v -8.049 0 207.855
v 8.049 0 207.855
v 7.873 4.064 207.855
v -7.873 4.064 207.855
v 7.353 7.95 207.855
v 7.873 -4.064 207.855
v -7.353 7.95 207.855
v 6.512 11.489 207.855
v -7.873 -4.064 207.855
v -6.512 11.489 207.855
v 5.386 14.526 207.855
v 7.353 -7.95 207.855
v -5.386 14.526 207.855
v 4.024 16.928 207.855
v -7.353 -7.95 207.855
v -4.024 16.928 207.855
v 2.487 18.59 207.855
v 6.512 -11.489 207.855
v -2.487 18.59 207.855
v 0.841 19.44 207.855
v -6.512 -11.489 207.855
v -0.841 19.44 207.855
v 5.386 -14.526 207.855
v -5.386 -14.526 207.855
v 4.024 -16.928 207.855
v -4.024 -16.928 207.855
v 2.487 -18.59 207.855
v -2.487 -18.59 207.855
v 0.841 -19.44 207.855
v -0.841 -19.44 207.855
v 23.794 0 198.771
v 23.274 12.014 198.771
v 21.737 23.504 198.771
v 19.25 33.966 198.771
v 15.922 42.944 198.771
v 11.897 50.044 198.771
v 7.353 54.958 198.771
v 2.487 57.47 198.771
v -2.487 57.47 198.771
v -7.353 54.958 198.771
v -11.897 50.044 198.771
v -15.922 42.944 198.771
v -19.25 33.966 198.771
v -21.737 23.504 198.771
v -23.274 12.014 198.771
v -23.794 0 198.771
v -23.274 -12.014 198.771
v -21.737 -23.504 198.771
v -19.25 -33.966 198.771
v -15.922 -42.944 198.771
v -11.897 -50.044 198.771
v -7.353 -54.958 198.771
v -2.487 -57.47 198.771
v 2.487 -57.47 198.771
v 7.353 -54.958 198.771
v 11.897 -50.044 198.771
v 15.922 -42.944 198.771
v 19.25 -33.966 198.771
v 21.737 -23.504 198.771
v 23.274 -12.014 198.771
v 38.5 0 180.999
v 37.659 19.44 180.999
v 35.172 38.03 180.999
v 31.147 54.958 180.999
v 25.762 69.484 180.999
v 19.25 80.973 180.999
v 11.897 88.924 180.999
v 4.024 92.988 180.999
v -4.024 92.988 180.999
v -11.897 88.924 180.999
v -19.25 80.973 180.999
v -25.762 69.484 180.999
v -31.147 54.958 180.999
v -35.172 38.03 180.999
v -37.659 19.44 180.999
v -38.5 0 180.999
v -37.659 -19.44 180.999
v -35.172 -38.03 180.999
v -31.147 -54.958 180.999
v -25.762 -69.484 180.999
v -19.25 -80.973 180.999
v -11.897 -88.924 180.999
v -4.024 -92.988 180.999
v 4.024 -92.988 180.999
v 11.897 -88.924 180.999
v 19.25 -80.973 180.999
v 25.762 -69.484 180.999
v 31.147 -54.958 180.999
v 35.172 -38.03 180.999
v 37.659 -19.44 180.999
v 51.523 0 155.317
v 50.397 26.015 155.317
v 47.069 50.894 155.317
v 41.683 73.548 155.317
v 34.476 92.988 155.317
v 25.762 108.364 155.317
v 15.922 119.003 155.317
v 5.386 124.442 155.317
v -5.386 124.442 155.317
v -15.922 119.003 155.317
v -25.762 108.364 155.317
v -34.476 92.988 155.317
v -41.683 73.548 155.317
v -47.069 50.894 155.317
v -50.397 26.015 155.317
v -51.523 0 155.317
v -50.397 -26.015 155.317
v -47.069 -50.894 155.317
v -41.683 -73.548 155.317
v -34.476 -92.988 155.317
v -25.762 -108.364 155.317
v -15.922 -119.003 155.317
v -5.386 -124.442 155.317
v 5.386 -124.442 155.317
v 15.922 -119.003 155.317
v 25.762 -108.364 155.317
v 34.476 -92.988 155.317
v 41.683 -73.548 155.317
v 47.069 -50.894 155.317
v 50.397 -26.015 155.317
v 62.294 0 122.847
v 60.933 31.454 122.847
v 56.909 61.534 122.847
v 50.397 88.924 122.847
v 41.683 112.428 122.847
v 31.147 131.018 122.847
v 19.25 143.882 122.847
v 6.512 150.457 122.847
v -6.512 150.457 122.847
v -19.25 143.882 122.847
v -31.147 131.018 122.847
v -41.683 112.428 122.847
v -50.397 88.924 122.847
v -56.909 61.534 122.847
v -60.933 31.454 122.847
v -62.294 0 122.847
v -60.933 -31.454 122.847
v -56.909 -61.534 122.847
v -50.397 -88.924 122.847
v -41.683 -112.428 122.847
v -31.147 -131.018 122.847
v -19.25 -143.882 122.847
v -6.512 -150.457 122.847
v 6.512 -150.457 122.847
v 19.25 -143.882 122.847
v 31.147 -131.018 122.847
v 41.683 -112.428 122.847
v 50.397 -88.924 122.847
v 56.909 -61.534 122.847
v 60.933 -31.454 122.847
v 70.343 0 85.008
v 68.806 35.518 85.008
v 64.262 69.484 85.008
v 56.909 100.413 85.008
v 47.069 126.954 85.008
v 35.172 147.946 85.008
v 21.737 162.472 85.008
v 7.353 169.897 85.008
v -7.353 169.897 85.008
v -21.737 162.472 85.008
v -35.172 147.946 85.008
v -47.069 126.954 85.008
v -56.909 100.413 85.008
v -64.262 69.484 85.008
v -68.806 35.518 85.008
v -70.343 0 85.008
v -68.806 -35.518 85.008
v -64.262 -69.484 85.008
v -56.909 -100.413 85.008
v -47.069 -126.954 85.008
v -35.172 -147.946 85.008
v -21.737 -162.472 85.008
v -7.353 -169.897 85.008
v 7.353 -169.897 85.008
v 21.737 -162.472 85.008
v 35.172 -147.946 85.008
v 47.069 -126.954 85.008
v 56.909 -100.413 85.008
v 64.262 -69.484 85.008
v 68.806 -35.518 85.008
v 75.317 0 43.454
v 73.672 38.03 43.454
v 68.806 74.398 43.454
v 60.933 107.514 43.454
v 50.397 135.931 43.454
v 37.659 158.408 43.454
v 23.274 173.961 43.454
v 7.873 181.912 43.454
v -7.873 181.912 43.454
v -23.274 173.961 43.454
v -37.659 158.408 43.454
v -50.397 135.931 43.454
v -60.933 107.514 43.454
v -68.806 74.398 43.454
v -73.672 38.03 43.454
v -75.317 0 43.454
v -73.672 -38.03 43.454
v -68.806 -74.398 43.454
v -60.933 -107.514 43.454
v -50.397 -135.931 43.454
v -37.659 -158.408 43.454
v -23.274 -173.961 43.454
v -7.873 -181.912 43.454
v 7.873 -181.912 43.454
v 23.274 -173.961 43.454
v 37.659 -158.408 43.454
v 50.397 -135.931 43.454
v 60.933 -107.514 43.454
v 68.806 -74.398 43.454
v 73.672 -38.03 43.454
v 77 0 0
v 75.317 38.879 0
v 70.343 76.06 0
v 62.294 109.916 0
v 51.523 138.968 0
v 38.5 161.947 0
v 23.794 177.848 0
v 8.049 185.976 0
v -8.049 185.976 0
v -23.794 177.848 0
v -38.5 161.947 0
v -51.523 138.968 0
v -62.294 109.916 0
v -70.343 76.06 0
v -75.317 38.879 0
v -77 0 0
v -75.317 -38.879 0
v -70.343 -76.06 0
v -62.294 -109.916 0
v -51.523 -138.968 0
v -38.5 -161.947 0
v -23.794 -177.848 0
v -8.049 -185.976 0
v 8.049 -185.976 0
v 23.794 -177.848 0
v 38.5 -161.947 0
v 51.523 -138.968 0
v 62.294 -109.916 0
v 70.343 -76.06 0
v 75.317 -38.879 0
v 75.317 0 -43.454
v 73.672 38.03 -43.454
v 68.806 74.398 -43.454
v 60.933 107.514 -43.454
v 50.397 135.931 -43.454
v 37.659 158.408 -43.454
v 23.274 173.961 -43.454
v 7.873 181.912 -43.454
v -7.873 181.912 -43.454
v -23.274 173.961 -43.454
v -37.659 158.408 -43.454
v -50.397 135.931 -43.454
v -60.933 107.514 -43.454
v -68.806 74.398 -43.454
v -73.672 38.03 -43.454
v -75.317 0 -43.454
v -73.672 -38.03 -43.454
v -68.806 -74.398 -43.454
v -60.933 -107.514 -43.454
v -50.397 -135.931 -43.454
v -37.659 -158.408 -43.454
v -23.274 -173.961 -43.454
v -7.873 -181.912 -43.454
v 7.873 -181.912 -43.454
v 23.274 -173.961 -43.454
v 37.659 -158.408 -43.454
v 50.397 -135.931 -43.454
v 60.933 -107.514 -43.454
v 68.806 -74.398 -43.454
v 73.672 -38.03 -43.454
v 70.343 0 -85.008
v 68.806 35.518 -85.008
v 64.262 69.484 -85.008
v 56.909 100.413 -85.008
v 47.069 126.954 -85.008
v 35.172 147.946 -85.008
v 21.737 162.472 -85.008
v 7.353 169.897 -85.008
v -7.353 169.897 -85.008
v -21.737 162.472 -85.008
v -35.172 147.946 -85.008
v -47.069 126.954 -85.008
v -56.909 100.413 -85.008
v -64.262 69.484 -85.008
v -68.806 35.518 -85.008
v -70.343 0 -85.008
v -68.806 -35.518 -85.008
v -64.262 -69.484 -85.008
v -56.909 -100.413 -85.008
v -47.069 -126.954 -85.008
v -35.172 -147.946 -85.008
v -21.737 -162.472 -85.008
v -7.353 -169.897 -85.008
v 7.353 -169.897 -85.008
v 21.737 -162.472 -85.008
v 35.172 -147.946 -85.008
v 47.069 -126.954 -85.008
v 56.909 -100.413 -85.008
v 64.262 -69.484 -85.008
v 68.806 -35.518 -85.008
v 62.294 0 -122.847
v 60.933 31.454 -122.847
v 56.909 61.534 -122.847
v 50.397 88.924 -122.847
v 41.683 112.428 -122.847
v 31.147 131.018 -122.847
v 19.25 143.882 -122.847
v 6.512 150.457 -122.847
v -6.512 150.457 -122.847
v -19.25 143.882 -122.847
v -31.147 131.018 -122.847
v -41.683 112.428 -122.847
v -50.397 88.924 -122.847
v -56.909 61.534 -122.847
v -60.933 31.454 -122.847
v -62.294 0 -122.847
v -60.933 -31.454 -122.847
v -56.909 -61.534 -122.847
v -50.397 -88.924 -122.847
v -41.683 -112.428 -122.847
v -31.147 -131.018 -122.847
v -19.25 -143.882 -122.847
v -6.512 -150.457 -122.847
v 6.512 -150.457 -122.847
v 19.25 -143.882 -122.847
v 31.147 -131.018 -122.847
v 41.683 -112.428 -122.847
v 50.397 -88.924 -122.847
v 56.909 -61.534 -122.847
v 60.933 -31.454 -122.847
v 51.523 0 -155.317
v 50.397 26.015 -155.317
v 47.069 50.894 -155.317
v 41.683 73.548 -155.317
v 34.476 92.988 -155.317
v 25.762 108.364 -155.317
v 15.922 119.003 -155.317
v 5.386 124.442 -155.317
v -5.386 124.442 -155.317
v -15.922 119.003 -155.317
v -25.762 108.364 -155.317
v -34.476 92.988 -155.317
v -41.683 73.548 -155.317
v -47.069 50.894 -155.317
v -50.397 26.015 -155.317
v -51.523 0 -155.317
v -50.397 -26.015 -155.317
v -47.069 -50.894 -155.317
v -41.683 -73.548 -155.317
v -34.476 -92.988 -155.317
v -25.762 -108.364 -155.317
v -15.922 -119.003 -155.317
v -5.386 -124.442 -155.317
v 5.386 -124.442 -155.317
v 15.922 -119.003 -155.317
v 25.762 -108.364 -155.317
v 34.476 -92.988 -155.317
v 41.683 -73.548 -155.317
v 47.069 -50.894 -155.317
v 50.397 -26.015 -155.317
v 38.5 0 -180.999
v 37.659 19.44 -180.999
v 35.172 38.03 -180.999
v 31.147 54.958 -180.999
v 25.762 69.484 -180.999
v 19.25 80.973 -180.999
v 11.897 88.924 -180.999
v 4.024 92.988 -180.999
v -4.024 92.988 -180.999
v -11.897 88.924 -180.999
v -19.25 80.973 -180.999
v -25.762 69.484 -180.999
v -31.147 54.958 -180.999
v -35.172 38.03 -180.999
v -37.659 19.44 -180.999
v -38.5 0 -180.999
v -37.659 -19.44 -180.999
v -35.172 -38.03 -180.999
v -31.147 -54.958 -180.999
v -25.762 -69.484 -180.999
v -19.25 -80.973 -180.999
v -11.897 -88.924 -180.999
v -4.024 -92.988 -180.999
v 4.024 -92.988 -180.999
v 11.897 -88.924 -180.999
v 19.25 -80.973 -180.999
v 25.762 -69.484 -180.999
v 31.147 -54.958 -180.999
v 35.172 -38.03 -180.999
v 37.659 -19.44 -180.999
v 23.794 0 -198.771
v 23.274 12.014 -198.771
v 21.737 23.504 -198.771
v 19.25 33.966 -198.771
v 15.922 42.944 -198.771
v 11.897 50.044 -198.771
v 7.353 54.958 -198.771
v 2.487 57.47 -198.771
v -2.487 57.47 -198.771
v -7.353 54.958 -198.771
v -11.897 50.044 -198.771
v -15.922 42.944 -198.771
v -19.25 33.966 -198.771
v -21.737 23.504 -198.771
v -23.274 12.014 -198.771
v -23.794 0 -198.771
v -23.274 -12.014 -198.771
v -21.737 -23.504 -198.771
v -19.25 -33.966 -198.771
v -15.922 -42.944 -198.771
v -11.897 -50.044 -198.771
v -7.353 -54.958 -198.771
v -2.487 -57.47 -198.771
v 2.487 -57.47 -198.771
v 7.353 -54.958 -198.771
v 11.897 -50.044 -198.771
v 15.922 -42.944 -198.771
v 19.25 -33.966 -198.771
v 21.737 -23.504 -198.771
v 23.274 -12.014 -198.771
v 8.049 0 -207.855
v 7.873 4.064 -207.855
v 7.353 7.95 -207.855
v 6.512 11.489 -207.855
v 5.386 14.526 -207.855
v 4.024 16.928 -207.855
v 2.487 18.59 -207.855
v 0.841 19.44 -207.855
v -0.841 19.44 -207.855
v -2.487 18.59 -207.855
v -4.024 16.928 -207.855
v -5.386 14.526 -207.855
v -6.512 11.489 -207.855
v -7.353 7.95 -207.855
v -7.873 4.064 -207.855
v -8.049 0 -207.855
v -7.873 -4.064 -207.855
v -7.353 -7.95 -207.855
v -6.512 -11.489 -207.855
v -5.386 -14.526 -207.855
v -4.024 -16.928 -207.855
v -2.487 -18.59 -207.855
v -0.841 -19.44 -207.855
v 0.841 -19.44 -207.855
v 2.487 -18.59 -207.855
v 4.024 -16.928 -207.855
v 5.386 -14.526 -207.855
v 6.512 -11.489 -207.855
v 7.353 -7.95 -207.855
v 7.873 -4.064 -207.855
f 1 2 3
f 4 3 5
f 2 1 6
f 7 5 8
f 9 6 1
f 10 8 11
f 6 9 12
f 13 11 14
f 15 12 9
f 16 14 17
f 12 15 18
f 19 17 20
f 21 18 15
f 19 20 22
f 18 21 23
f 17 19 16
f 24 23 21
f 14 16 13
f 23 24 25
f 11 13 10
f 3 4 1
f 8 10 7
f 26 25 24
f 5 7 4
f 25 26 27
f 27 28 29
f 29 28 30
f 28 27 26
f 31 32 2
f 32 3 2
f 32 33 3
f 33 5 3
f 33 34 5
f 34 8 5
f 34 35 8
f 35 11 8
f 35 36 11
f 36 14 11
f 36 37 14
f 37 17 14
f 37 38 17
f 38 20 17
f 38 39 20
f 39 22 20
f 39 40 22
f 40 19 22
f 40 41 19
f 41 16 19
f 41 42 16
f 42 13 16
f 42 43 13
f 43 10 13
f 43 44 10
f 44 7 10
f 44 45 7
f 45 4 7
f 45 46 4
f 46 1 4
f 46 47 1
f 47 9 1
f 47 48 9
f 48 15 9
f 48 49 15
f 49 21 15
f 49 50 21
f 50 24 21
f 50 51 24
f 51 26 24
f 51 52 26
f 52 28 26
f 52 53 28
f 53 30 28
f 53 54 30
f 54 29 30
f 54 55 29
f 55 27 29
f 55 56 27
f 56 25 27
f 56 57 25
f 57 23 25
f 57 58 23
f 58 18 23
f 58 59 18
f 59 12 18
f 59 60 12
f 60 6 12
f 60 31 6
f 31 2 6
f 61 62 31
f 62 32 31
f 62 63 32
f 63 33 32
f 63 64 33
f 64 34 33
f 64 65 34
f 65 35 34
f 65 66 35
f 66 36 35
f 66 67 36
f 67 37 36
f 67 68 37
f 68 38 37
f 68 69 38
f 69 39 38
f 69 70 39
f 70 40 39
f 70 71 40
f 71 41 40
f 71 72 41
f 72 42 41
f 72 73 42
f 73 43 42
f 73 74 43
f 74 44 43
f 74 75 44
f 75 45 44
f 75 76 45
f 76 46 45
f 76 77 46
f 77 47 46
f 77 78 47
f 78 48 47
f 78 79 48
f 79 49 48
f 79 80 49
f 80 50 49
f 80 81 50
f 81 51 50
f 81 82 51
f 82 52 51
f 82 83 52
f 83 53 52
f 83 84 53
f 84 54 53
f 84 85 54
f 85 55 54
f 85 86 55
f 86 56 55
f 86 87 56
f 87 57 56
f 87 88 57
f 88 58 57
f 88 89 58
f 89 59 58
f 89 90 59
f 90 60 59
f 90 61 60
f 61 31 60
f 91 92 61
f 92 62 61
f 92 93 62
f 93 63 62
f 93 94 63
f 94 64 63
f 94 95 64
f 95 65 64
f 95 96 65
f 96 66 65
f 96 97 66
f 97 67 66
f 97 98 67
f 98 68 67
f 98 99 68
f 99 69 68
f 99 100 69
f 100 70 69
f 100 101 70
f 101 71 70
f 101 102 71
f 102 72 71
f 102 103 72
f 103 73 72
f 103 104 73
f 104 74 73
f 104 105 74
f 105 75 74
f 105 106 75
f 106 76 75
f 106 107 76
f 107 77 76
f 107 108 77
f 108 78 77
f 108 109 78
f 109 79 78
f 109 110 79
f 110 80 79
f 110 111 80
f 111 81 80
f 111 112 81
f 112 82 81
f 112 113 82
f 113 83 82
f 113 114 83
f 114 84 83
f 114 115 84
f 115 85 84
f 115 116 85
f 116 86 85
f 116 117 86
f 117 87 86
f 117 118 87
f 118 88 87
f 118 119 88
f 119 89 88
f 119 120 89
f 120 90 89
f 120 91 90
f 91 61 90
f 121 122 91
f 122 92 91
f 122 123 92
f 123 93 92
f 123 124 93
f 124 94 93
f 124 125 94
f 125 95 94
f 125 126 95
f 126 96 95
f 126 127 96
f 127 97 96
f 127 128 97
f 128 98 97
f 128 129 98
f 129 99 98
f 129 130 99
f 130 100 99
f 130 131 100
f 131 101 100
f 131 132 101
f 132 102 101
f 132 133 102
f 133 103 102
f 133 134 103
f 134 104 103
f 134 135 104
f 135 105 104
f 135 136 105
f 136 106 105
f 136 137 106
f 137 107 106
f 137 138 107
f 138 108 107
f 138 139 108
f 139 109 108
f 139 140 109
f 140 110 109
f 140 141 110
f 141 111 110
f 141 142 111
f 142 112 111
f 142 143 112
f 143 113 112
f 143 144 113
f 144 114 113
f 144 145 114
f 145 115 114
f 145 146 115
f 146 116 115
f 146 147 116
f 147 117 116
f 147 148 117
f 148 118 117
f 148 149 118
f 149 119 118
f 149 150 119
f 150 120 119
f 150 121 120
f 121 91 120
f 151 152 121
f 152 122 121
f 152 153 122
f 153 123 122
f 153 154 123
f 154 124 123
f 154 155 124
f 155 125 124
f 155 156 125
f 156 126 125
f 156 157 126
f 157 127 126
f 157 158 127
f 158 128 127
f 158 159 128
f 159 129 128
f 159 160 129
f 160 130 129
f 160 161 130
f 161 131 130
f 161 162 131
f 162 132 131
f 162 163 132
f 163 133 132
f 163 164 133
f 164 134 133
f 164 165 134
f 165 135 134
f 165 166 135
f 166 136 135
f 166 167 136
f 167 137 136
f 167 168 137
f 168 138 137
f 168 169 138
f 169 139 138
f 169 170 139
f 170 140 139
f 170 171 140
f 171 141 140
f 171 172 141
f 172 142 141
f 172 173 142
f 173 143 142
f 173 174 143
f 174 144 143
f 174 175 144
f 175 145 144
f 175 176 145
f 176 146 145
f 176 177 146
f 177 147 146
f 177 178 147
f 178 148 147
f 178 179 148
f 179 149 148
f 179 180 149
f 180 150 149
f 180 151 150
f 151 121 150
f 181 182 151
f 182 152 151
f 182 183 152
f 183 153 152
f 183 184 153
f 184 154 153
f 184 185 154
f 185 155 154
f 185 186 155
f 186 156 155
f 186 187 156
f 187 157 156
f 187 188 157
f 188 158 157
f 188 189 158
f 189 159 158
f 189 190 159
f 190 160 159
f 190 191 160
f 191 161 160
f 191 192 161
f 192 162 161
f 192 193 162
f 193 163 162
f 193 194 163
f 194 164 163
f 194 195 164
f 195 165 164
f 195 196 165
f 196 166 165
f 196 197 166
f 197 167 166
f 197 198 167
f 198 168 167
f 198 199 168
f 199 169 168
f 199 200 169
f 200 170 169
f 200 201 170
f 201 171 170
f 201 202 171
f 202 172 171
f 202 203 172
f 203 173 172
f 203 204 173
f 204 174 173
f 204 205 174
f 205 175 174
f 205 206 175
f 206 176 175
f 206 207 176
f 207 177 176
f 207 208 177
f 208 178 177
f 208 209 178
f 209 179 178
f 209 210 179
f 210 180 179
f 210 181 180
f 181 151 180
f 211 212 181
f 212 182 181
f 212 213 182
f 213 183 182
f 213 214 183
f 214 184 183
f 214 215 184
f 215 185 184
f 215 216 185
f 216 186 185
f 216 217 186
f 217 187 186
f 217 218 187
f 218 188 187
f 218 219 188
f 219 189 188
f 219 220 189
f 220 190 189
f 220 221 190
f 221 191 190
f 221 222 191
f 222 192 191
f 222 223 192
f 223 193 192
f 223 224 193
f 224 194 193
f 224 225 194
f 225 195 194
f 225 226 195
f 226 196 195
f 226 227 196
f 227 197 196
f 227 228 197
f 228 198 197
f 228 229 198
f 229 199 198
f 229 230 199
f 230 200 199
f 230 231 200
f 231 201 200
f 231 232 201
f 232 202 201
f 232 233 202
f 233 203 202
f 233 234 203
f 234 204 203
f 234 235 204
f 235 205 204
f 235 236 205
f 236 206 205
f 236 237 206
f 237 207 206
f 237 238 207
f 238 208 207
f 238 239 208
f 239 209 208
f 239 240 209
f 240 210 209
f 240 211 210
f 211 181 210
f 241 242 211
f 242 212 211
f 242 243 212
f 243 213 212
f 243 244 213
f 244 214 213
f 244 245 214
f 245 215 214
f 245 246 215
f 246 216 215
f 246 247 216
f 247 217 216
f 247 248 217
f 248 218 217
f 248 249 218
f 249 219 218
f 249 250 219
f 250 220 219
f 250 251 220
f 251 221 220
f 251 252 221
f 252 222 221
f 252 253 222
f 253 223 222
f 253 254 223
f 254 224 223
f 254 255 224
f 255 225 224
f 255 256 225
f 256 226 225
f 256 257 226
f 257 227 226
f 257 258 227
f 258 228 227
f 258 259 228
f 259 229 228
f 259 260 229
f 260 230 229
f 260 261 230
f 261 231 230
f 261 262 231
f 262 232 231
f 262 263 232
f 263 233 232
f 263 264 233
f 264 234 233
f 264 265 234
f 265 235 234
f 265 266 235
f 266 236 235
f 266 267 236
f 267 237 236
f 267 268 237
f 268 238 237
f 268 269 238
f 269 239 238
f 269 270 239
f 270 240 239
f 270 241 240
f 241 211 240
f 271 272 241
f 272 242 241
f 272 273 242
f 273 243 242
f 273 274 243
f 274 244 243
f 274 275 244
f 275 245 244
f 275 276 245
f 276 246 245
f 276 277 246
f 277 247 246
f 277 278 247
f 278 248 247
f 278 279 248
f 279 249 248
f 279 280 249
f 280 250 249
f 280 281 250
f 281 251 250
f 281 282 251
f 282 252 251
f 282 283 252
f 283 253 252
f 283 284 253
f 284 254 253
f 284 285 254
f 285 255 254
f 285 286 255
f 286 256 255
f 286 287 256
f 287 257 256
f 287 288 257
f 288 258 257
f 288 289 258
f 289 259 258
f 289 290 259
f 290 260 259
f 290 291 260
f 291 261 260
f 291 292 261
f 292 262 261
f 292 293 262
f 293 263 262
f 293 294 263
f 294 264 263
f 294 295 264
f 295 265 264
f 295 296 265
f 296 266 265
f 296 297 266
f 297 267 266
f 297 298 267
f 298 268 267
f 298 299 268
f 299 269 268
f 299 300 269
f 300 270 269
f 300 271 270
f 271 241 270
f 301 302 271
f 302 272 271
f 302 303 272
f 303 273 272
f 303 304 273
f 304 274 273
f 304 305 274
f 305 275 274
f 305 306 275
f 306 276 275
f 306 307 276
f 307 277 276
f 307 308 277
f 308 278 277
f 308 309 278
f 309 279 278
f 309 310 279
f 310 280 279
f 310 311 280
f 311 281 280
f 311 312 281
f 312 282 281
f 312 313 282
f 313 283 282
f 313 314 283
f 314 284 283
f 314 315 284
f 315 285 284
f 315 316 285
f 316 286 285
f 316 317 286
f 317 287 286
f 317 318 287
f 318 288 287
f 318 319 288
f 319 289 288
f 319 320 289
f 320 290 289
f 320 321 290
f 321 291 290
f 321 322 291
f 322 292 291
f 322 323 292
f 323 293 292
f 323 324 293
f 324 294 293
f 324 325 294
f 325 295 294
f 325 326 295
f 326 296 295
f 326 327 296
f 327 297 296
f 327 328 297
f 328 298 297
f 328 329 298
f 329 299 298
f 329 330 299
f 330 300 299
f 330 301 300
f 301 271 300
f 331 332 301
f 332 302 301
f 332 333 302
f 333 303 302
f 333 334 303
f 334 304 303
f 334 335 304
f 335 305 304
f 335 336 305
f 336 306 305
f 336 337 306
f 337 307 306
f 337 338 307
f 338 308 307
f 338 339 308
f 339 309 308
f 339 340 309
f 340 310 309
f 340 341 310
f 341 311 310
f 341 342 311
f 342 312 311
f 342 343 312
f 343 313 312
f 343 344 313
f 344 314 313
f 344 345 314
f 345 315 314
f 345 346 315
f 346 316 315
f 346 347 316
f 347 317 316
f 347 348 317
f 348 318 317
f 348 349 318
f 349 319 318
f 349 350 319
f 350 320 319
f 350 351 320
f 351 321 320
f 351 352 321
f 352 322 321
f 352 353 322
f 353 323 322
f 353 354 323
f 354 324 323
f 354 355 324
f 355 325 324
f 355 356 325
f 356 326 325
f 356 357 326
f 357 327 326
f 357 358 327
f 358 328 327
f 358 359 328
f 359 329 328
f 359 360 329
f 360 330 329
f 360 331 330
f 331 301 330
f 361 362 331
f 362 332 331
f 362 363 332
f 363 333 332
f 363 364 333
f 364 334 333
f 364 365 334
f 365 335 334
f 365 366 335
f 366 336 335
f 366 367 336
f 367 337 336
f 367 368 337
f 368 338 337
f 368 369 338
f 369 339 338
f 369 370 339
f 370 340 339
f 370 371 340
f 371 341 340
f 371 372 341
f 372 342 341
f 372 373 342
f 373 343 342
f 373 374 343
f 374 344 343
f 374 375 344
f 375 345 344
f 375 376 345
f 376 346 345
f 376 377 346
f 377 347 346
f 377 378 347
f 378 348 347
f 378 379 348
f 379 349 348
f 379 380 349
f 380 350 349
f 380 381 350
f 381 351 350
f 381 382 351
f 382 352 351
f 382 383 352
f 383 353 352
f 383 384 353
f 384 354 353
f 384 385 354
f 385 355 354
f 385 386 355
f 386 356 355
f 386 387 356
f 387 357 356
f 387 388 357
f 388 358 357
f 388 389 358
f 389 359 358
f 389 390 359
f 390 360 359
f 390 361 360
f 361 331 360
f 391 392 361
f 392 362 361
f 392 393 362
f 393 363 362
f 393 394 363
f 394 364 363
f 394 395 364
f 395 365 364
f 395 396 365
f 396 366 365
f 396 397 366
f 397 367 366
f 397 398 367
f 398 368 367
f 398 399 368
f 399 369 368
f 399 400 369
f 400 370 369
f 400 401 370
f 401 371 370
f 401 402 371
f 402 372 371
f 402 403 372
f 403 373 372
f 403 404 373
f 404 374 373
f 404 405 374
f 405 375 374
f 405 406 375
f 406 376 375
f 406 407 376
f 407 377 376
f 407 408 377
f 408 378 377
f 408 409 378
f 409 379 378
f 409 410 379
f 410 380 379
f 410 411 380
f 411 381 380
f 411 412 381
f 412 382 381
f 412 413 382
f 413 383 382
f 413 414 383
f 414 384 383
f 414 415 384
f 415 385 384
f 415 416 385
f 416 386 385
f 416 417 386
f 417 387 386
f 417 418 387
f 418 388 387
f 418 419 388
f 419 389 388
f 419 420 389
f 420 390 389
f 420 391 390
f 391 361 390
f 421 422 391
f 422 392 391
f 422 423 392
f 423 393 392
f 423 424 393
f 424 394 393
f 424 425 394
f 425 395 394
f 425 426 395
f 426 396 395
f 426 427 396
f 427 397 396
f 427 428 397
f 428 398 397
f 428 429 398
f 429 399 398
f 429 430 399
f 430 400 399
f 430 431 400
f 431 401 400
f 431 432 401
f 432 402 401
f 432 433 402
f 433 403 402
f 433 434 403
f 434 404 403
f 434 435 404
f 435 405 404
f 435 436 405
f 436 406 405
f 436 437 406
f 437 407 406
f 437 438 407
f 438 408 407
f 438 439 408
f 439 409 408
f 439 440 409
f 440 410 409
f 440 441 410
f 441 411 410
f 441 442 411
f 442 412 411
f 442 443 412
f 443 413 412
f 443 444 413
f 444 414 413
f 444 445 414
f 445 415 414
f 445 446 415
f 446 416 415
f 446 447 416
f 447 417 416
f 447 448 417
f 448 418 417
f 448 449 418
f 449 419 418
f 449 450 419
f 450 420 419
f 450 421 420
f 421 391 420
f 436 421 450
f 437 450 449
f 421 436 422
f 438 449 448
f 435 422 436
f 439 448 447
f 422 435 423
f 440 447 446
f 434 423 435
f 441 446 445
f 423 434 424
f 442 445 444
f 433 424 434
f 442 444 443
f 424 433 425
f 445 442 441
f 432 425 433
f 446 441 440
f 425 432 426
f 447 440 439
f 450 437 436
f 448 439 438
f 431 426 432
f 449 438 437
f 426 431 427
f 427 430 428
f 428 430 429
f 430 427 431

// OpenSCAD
// Generated by SolidPython 1.0.1 on 2020-07-29 00:46:48


scale(v = [7, 17, 19]) {
	sphere(r = 11);
}
/***********************************************
*********      SolidPython code:      **********
************************************************
 
# import packages: SolidPython
from solid import *
from solid.utils import *
from itertools import chain, combinations, permutations


class Resize:

    def __init__(self, scad_file):
        self.scad_file = scad_file
        #self.scad_file = import_scad(scad_file)
        # cone/cylinder param:
        self.r1 = 0
        self.r2 = 0
        self.h = 0
        # rectangular prism param:
        self.w = 0
        self.l = 0
        # ellipse param:
        self.r = 0

    # import OpenScad code (file name corresponds to shape)


    # classify shape + parameters
    def assign(self, param1, param2, param3):
        if self.scad_file == 'cone.scad':
            self.r1 = param1
            self.r2 = param2
            self.h = param3
        elif self.scad_file == 'cylinder.scad':
            self.r1 = param1
            self.r2 = param2
            self.h = param3
        elif self.scad_file == 'rectangularPrism.scad':
            self.h = param1
            self.l = param2
            self.w = param3
        else:
            self.r = param1
            self.h = param2

    # resize parameters
    def iterate(self):
        x = range(3, 20, 2)
        i = 1
        if self.scad_file == 'cone.scad':
            tempList = list(permutations(x, 2))
            for temp in tempList:
                param1 = temp[0]
                param2 = temp[1]
                filepath = 'produced_scad_files/' + 'cone' + str(param1) + '_' + str(param2) + '_' + '.scad'
                scad_render_to_file(cylinder(h=param1, r1=param2, r2=0), filepath)

        elif self.scad_file == 'cylinder.scad':
            tempList = list(permutations(x, 3))
            for temp in tempList:
                param1 = temp[0]
                param2 = temp[1]
                filepath = 'produced_scad_files/' + 'cylinder' + str(param1) + '_' + str(param2) + '_' + '.scad'
                scad_render_to_file(cylinder(h=param1, r1=param2, r2=param2), filepath)

        elif self.scad_file == 'rectangularPrism.scad':
            tempList = list(permutations(x, 3))
            for temp in tempList:
                param1 = temp[0]
                param2 = temp[1]
                param3 = temp[2]
                filepath = 'produced_scad_files/' + 'rectangularPrism' + str(param1) + '_' + str(param2) + '_' + str(
                    param3) + '.scad'
                scad_render_to_file(cube(size=(param1, param2, param3)), filepath)

        elif self.scad_file == 'ellipse.scad':
            tempList = list(permutations(x, 4))
            for temp in tempList:
                param1 = temp[0]
                param2 = temp[1]
                param3 = temp[2]
                param4 = temp[3]
                filepath = 'produced_scad_files/' + 'ellipse' + str(param1) + '_' + str(param2) + '_' + str(param3) + '_' + str(param4) + '.scad'
                scad_render_to_file(scale([param1, param2, param3])(sphere(r=param4)), filepath)

    def render_to_scadfile(self):
        scad_render_to_file(scad, 'example.scad') 
 
************************************************/
